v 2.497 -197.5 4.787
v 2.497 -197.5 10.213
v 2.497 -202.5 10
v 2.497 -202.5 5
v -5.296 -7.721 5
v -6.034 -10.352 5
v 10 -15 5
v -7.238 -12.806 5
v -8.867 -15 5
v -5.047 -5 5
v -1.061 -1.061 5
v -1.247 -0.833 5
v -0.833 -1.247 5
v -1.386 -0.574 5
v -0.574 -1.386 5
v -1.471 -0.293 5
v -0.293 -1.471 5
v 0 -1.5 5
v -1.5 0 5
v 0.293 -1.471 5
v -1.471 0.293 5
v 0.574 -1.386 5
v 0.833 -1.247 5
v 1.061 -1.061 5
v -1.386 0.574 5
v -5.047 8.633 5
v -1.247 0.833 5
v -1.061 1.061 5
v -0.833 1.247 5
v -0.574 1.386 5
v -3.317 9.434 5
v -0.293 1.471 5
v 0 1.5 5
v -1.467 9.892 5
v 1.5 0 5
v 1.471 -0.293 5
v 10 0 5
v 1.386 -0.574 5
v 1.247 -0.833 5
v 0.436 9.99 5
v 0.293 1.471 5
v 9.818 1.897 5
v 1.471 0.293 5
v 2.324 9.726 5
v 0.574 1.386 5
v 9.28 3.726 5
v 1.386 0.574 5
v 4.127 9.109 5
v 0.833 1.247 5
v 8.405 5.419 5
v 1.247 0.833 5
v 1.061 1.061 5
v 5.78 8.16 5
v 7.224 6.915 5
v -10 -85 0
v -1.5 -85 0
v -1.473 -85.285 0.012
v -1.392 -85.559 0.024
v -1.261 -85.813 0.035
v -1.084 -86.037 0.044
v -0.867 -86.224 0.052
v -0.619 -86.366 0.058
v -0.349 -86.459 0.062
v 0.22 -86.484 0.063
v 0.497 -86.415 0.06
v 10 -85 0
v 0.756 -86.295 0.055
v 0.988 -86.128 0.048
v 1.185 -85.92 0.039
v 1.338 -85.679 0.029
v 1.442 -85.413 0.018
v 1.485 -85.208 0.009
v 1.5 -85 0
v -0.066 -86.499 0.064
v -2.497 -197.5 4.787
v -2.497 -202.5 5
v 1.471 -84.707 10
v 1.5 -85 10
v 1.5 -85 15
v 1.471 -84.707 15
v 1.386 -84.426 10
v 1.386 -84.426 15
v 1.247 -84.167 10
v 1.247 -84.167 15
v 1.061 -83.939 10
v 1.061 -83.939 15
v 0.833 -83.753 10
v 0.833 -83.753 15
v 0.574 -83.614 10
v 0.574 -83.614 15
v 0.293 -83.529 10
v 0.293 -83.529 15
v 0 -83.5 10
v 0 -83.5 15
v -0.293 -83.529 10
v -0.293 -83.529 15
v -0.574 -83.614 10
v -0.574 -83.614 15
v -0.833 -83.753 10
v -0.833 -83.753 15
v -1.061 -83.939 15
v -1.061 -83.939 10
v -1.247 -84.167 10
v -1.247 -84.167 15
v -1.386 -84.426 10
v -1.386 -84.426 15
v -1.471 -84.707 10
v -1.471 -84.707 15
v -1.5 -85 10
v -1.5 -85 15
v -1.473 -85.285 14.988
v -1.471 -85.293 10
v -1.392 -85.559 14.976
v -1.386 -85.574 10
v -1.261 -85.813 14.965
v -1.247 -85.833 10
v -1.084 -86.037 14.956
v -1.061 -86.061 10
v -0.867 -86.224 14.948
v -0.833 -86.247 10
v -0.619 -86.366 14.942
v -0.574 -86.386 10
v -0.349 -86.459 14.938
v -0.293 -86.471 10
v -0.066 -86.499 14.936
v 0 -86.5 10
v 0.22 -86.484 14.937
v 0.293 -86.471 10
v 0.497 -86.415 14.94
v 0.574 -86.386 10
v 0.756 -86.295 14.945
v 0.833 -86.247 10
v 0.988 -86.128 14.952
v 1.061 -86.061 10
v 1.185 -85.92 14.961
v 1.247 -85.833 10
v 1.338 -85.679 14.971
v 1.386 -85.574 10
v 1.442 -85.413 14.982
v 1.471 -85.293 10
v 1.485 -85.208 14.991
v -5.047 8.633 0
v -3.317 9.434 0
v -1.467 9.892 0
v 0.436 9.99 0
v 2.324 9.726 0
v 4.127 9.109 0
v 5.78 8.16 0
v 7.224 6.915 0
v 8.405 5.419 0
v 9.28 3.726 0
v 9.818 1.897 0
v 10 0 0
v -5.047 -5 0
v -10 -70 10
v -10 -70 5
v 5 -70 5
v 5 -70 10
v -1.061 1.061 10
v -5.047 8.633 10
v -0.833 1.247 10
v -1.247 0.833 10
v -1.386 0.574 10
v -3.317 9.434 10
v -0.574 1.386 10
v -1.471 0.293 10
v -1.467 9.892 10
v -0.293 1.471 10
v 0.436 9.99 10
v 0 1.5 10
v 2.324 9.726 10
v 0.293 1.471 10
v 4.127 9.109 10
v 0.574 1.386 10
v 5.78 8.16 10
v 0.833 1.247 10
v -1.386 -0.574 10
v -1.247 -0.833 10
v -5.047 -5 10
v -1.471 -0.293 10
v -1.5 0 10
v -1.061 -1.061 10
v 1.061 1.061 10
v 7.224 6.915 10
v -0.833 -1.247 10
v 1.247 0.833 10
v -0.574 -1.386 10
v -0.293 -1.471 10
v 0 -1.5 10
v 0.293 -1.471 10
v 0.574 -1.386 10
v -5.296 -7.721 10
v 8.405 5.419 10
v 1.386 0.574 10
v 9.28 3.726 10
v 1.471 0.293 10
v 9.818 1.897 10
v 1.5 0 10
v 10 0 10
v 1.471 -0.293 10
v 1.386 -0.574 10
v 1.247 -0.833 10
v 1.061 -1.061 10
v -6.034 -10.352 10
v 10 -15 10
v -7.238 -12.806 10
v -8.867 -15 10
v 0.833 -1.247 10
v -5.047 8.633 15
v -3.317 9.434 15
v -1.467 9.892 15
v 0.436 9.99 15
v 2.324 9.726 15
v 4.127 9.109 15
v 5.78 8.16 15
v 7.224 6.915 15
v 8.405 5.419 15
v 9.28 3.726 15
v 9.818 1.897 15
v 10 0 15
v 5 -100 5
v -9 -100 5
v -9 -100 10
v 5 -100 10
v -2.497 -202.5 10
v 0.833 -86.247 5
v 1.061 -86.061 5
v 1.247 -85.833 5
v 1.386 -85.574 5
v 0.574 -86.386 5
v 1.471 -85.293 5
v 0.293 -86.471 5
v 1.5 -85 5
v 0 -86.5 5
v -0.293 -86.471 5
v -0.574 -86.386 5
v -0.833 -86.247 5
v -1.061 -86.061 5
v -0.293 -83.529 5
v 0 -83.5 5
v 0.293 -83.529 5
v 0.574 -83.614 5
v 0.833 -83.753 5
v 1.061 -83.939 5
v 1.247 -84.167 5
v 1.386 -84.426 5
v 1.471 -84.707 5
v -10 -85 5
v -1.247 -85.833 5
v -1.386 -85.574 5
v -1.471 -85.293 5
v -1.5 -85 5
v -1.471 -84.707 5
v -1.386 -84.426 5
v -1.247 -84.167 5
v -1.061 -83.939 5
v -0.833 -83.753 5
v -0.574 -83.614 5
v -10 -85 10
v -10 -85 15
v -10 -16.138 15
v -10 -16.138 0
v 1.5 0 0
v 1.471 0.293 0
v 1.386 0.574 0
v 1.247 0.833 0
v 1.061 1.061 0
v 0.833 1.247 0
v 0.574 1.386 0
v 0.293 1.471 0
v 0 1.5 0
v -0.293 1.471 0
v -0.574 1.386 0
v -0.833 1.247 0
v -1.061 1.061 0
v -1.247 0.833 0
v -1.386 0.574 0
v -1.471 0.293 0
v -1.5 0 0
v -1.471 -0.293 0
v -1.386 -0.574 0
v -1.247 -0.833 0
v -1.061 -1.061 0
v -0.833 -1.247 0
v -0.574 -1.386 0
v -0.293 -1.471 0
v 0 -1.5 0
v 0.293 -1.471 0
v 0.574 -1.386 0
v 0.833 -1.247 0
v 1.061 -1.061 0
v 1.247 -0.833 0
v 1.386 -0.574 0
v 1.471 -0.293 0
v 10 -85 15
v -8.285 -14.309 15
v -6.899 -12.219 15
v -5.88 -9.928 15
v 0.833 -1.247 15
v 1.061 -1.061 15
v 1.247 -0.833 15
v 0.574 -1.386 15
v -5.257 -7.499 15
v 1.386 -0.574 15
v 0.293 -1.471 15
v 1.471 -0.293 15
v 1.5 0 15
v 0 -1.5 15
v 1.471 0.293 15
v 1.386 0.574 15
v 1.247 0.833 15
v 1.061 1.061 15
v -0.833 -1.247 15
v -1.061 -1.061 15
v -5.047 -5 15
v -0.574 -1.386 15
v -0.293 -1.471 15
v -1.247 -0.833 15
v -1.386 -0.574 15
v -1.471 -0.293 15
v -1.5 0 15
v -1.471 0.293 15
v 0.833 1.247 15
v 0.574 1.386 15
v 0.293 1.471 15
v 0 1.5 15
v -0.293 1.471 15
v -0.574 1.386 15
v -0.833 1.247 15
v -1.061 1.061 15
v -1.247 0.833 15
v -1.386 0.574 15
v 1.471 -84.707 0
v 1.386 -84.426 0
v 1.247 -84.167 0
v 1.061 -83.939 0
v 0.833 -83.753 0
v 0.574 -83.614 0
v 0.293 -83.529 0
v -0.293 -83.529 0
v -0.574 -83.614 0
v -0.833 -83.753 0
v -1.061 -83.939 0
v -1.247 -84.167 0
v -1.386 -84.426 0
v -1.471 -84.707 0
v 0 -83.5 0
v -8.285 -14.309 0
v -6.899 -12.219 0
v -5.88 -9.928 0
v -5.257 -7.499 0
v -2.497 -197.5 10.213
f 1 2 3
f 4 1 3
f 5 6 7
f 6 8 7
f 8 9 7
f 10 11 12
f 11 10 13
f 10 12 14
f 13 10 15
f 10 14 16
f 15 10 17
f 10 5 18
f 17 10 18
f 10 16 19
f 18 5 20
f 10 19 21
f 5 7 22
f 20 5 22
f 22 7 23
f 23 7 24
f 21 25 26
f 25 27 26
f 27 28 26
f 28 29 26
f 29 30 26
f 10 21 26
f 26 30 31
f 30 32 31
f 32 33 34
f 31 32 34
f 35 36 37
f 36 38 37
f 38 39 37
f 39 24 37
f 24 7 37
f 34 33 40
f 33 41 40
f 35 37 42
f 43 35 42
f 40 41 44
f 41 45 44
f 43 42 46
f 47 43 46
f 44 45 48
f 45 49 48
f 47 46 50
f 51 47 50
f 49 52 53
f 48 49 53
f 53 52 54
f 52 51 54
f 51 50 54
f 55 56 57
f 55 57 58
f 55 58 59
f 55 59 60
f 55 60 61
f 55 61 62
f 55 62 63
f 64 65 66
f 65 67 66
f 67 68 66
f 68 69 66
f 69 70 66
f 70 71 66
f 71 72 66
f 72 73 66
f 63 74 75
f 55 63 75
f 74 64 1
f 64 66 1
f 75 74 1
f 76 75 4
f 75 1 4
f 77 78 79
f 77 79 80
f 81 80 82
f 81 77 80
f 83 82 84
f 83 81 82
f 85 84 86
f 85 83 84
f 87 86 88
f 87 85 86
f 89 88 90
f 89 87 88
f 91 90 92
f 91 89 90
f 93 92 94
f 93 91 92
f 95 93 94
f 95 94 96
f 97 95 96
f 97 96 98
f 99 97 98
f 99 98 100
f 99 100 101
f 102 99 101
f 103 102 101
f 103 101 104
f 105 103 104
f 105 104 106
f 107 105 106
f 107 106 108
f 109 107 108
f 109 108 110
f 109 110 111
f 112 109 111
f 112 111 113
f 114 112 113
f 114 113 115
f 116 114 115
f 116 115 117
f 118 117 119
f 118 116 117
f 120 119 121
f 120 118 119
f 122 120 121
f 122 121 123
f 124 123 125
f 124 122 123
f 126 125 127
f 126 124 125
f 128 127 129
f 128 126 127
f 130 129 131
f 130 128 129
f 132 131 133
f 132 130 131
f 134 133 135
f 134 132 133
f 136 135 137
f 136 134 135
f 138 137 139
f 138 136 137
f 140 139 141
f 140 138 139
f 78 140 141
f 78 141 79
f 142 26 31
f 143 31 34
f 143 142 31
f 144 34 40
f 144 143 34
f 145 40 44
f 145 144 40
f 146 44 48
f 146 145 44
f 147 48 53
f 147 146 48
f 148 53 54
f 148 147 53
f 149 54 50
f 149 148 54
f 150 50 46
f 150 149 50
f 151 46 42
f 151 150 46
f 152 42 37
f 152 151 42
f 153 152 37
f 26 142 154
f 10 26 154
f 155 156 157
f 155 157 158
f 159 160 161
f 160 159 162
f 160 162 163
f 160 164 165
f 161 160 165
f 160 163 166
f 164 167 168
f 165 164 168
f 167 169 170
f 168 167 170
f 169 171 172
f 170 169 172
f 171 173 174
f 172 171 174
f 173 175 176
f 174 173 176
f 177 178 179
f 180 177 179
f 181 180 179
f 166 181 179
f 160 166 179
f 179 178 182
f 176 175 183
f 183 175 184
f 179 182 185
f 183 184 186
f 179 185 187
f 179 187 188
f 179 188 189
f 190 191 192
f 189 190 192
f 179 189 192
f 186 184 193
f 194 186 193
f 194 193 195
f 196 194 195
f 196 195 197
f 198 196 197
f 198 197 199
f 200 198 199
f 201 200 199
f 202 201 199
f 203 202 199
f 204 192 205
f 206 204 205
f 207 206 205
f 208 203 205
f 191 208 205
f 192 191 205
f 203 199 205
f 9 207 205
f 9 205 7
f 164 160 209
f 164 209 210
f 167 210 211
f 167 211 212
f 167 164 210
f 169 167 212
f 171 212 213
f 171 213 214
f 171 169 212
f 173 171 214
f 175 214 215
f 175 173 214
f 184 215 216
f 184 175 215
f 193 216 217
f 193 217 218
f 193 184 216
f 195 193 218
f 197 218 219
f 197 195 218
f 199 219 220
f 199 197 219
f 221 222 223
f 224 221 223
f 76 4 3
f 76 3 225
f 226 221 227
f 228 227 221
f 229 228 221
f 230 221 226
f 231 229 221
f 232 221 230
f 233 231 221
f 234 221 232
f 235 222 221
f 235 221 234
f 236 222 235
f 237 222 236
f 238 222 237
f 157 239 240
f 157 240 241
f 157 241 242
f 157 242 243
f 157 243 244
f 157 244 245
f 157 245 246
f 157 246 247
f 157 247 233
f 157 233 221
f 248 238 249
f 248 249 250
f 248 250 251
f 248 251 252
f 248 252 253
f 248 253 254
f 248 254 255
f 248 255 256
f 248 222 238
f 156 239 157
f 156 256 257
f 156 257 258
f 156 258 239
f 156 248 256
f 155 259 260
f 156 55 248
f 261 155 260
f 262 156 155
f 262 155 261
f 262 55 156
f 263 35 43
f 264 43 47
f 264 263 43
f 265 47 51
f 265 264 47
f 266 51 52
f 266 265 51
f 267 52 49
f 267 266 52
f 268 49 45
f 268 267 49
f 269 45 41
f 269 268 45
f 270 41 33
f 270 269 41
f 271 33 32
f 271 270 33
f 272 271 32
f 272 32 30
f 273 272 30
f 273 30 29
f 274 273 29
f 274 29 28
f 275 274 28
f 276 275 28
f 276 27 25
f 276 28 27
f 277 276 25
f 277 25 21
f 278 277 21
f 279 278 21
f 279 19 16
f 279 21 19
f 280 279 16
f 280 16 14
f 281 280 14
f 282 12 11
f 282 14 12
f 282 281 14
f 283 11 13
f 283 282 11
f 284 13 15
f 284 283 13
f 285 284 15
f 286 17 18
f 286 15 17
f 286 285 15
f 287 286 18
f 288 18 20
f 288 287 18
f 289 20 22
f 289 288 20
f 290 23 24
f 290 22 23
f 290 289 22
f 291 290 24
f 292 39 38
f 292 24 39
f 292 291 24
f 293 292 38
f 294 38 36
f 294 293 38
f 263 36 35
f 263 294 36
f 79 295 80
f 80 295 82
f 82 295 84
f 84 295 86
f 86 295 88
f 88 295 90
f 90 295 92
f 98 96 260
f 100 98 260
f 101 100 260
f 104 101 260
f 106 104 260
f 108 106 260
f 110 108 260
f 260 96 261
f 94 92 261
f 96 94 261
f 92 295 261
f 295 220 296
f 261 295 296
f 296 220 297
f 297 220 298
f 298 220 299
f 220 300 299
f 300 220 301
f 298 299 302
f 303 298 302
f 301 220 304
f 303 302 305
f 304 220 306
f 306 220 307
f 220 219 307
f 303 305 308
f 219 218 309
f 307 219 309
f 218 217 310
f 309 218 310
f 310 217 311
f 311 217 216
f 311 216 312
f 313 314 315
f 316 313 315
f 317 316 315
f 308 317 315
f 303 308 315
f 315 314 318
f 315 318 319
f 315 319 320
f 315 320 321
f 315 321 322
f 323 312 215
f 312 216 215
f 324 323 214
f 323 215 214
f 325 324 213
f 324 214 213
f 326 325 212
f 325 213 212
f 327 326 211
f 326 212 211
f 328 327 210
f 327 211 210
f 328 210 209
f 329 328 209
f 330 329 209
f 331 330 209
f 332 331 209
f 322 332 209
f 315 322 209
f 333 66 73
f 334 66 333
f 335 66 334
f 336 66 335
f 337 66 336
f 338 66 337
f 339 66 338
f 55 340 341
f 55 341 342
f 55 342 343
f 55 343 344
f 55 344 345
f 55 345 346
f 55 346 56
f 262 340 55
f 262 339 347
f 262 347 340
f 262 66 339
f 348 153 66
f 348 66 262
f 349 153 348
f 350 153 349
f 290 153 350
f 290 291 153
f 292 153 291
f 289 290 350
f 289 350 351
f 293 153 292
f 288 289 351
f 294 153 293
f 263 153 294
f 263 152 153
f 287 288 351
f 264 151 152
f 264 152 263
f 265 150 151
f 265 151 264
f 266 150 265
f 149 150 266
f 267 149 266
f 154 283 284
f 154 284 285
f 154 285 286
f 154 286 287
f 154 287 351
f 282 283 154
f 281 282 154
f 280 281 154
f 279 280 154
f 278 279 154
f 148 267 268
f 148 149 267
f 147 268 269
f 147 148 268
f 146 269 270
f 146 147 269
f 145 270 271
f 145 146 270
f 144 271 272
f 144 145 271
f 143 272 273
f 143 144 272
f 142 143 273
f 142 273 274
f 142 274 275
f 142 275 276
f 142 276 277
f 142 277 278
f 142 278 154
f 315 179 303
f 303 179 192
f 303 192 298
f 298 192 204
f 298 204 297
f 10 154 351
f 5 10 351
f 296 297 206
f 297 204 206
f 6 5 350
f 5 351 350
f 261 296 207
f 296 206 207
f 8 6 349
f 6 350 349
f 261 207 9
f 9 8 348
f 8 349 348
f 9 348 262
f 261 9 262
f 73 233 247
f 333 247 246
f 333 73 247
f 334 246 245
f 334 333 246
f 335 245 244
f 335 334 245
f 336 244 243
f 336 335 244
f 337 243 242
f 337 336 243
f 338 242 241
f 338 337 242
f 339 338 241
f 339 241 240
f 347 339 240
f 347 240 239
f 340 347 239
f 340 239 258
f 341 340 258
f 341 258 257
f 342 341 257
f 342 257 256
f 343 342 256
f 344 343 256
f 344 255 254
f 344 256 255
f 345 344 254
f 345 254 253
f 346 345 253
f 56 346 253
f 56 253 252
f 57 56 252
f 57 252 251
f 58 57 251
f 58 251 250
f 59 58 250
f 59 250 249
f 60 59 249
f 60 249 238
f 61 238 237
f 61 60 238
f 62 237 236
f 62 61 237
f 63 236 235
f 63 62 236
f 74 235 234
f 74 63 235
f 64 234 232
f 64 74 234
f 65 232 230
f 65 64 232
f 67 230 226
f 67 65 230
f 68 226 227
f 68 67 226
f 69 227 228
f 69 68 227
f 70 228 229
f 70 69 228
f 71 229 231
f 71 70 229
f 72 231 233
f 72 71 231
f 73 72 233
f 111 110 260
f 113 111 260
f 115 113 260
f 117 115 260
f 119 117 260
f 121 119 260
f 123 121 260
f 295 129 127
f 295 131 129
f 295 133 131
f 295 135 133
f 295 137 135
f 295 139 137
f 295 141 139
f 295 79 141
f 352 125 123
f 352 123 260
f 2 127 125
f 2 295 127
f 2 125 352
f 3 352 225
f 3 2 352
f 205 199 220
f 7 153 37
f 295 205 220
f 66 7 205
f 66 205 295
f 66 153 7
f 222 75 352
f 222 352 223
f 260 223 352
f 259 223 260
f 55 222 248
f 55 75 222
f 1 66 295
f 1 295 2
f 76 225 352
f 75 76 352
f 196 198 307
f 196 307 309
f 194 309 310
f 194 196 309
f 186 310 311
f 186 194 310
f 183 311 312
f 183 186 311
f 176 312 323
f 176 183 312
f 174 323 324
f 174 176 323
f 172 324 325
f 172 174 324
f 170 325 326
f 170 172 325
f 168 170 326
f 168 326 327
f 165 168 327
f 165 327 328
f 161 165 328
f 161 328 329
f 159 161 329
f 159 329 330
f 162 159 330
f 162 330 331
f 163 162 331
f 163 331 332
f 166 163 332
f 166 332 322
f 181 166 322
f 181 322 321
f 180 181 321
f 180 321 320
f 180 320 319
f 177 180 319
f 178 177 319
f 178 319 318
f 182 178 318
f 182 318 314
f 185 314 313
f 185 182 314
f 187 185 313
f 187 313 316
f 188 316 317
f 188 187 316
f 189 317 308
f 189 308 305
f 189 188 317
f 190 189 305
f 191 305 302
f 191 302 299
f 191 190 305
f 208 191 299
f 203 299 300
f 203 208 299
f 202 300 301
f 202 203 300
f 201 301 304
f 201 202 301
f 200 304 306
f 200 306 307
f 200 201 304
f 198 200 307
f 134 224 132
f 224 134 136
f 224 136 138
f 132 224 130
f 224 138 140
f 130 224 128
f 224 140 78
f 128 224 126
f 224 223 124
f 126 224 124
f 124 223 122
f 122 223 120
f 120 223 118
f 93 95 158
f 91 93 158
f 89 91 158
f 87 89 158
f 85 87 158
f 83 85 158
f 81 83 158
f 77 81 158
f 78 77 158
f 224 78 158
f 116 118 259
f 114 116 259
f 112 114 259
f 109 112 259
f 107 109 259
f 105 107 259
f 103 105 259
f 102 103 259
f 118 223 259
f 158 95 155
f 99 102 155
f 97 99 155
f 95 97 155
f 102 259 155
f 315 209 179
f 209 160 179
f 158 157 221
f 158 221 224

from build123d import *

# Parameters (mm, degrees)
CROQUIS1_R              = 1.5
SALIENTE_EXTRUIR1_DEPTH = 15
CROQUIS2_W              = 5
CROQUIS2_H              = 15
CROQUIS2_H_2            = 35
CORTAR_EXTRUIR1_DEPTH   = 60
CROQUIS4_W              = 5
CROQUIS4_H              = 30
CORTAR_EXTRUIR2_DEPTH   = 15
CORTAR_EXTRUIR3_DEPTH   = 40


with BuildPart() as part:
    # Croquis1 → Saliente-Extruir1 (new body)
    with BuildSketch(Plane.XY):
        with BuildLine():
            Line((10, 0), (10, -85))
            Line((10, -85), (2.49701529, -197.5))
            Line((2.49701529, -197.5), (2.49701529, -202.5))
            Line((2.49701529, -202.5), (-2.49701529, -202.5))
            Line((-2.49701529, -202.5), (-2.49701529, -197.5))
            Line((-2.49701529, -197.5), (-10, -85))
            Line((-10, -85), (-10, 0))
            ThreePointArc((-10, 0), (0, 10), (10, 0))
        make_face()
        with Locations((0, -85)):
            Circle(CROQUIS1_R, mode=Mode.SUBTRACT)
        Circle(CROQUIS1_R, mode=Mode.SUBTRACT)
    extrude(amount=SALIENTE_EXTRUIR1_DEPTH)

    # Croquis2 → Cortar-Extruir1 (cut)
    with BuildSketch(Plane(origin=(10, 0, 0), x_dir=(0, 0, -1), z_dir=(1, 0, 0))):
        with Locations((-7.5, -7.5)):
            Rectangle(CROQUIS2_W, CROQUIS2_H)
        with Locations((-7.5, 17.5)):
            Rectangle(CROQUIS2_W, CROQUIS2_H_2)
        Polygon((-15, -85), (-10, -202.5), (-18.081893827, -208.021253548), align=None)
        Polygon((-5, -202.5), (3.081893827, -208.021253548), (0, -85), align=None)
    extrude(amount=-CORTAR_EXTRUIR1_DEPTH, mode=Mode.SUBTRACT)

    # Croquis4 → Cortar-Extruir2 (cut)
    with BuildSketch(Plane.ZY.offset(10)):
        with Locations((7.5, -85)):
            Rectangle(CROQUIS4_W, CROQUIS4_H)
    extrude(amount=-CORTAR_EXTRUIR2_DEPTH, mode=Mode.SUBTRACT)

    # Croquis5 → Cortar-Extruir3 (cut)
    with BuildSketch(Plane(origin=(0, 0, 0), x_dir=(-1, 0, 0), z_dir=(0, 0, -1))):
        with BuildLine():
            Line((20.047011477, -20), (24.874582677, -20))
            Line((24.874582677, -20), (24.874582677, 13.063406197))
            Line((24.874582677, 13.063406197), (10, 13.063406197))
            Line((10, 13.063406197), (10, 14.482732523))
            Line((10, 14.482732523), (5.047011477, 14.482732523))
            Line((5.047011477, 14.482732523), (5.047011477, -5))
            ThreePointArc((5.047011477, -5), (9.440409759, -15.606601718), (20.047011477, -20))
        make_face()
    extrude(amount=-CORTAR_EXTRUIR3_DEPTH, mode=Mode.SUBTRACT)


solid = part.part
